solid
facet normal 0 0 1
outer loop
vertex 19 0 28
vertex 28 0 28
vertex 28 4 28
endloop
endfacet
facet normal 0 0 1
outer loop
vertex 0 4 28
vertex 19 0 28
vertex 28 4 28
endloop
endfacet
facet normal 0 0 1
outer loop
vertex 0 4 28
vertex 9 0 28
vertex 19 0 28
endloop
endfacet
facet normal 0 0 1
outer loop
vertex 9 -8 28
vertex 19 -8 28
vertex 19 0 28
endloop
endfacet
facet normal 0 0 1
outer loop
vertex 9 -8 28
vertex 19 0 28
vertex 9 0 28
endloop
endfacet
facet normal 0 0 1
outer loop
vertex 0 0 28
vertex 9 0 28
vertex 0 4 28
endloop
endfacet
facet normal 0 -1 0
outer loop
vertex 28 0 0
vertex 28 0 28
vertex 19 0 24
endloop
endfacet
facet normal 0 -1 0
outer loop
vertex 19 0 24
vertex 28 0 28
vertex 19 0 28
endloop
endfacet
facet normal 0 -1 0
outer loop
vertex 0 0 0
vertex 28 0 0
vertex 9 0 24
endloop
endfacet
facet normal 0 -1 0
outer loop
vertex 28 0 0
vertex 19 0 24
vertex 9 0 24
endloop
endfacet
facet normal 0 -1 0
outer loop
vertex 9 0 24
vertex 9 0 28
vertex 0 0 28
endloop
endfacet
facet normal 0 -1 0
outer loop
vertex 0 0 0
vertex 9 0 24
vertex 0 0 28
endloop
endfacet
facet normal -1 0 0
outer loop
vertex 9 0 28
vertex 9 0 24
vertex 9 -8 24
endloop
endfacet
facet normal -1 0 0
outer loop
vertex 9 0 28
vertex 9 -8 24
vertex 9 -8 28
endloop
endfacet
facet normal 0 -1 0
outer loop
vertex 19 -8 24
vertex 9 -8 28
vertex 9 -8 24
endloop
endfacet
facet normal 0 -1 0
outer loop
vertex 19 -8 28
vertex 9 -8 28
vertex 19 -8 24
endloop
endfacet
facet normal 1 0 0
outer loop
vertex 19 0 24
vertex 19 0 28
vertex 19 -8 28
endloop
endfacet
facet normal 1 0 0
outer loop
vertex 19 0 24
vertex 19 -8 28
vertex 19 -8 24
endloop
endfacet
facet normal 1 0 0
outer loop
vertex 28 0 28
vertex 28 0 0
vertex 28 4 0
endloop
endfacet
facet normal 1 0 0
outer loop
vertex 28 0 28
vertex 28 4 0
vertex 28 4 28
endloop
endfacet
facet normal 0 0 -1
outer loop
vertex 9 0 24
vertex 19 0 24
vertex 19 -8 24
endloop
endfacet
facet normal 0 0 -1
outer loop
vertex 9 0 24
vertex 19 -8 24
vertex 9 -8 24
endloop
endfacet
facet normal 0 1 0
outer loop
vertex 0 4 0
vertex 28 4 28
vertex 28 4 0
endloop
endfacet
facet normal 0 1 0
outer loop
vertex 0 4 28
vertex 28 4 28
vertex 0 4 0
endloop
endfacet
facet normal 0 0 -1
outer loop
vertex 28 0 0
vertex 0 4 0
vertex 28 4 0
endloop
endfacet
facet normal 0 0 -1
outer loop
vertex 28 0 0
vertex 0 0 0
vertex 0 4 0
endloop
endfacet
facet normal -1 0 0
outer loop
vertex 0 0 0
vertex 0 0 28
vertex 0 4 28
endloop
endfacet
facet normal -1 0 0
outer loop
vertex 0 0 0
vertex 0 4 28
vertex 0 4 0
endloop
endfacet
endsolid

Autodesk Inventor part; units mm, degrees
ref_plane "YZ Plane" through (0, 0, 0) normal (1, 0, 0) x (0, 1, 0)
ref_plane "XZ Plane" through (0, 0, 0) normal (0, 1, 0) x (-1, 0, 0)
ref_plane "XY Plane" through (0, 0, 0) normal (0, 0, 1) x (1, 0, 0)
sketch "Sketch1" plane through (0, 0, 0) normal (0, 1, 0) x (-1, 0, 0)
  line L0 (0, 0) -> (-28, 0)
  line L1 (-28, 0) -> (-28, 28)
  line L2 (-28, 28) -> (0, 28)
  line L3 (0, 28) -> (0, 0)
  dimension "d0" = 28
  dimension "d1" = 28
extrude "Extrusion1" add sketch "Sketch1" along normal blind 4
sketch "Sketch2" plane through (0, 0, 0) normal (0, -1, 0) x (1, 0, 0)
  line L0 (0, 28) -> (28, 28) projected
  line L1 (14, 28) -> (19, 28)
  line L2 (19, 28) -> (19, 24)
  line L3 (19, 24) -> (9, 24)
  line L4 (9, 24) -> (9, 28)
  point P0 (0, 0)
  dimension "d6" = 5
  dimension "d7" = 4
  dimension "d8" = 10
extrude "Extrusion2" add sketch "Sketch2" along normal blind 8
properties part number "Schemo lcd"
